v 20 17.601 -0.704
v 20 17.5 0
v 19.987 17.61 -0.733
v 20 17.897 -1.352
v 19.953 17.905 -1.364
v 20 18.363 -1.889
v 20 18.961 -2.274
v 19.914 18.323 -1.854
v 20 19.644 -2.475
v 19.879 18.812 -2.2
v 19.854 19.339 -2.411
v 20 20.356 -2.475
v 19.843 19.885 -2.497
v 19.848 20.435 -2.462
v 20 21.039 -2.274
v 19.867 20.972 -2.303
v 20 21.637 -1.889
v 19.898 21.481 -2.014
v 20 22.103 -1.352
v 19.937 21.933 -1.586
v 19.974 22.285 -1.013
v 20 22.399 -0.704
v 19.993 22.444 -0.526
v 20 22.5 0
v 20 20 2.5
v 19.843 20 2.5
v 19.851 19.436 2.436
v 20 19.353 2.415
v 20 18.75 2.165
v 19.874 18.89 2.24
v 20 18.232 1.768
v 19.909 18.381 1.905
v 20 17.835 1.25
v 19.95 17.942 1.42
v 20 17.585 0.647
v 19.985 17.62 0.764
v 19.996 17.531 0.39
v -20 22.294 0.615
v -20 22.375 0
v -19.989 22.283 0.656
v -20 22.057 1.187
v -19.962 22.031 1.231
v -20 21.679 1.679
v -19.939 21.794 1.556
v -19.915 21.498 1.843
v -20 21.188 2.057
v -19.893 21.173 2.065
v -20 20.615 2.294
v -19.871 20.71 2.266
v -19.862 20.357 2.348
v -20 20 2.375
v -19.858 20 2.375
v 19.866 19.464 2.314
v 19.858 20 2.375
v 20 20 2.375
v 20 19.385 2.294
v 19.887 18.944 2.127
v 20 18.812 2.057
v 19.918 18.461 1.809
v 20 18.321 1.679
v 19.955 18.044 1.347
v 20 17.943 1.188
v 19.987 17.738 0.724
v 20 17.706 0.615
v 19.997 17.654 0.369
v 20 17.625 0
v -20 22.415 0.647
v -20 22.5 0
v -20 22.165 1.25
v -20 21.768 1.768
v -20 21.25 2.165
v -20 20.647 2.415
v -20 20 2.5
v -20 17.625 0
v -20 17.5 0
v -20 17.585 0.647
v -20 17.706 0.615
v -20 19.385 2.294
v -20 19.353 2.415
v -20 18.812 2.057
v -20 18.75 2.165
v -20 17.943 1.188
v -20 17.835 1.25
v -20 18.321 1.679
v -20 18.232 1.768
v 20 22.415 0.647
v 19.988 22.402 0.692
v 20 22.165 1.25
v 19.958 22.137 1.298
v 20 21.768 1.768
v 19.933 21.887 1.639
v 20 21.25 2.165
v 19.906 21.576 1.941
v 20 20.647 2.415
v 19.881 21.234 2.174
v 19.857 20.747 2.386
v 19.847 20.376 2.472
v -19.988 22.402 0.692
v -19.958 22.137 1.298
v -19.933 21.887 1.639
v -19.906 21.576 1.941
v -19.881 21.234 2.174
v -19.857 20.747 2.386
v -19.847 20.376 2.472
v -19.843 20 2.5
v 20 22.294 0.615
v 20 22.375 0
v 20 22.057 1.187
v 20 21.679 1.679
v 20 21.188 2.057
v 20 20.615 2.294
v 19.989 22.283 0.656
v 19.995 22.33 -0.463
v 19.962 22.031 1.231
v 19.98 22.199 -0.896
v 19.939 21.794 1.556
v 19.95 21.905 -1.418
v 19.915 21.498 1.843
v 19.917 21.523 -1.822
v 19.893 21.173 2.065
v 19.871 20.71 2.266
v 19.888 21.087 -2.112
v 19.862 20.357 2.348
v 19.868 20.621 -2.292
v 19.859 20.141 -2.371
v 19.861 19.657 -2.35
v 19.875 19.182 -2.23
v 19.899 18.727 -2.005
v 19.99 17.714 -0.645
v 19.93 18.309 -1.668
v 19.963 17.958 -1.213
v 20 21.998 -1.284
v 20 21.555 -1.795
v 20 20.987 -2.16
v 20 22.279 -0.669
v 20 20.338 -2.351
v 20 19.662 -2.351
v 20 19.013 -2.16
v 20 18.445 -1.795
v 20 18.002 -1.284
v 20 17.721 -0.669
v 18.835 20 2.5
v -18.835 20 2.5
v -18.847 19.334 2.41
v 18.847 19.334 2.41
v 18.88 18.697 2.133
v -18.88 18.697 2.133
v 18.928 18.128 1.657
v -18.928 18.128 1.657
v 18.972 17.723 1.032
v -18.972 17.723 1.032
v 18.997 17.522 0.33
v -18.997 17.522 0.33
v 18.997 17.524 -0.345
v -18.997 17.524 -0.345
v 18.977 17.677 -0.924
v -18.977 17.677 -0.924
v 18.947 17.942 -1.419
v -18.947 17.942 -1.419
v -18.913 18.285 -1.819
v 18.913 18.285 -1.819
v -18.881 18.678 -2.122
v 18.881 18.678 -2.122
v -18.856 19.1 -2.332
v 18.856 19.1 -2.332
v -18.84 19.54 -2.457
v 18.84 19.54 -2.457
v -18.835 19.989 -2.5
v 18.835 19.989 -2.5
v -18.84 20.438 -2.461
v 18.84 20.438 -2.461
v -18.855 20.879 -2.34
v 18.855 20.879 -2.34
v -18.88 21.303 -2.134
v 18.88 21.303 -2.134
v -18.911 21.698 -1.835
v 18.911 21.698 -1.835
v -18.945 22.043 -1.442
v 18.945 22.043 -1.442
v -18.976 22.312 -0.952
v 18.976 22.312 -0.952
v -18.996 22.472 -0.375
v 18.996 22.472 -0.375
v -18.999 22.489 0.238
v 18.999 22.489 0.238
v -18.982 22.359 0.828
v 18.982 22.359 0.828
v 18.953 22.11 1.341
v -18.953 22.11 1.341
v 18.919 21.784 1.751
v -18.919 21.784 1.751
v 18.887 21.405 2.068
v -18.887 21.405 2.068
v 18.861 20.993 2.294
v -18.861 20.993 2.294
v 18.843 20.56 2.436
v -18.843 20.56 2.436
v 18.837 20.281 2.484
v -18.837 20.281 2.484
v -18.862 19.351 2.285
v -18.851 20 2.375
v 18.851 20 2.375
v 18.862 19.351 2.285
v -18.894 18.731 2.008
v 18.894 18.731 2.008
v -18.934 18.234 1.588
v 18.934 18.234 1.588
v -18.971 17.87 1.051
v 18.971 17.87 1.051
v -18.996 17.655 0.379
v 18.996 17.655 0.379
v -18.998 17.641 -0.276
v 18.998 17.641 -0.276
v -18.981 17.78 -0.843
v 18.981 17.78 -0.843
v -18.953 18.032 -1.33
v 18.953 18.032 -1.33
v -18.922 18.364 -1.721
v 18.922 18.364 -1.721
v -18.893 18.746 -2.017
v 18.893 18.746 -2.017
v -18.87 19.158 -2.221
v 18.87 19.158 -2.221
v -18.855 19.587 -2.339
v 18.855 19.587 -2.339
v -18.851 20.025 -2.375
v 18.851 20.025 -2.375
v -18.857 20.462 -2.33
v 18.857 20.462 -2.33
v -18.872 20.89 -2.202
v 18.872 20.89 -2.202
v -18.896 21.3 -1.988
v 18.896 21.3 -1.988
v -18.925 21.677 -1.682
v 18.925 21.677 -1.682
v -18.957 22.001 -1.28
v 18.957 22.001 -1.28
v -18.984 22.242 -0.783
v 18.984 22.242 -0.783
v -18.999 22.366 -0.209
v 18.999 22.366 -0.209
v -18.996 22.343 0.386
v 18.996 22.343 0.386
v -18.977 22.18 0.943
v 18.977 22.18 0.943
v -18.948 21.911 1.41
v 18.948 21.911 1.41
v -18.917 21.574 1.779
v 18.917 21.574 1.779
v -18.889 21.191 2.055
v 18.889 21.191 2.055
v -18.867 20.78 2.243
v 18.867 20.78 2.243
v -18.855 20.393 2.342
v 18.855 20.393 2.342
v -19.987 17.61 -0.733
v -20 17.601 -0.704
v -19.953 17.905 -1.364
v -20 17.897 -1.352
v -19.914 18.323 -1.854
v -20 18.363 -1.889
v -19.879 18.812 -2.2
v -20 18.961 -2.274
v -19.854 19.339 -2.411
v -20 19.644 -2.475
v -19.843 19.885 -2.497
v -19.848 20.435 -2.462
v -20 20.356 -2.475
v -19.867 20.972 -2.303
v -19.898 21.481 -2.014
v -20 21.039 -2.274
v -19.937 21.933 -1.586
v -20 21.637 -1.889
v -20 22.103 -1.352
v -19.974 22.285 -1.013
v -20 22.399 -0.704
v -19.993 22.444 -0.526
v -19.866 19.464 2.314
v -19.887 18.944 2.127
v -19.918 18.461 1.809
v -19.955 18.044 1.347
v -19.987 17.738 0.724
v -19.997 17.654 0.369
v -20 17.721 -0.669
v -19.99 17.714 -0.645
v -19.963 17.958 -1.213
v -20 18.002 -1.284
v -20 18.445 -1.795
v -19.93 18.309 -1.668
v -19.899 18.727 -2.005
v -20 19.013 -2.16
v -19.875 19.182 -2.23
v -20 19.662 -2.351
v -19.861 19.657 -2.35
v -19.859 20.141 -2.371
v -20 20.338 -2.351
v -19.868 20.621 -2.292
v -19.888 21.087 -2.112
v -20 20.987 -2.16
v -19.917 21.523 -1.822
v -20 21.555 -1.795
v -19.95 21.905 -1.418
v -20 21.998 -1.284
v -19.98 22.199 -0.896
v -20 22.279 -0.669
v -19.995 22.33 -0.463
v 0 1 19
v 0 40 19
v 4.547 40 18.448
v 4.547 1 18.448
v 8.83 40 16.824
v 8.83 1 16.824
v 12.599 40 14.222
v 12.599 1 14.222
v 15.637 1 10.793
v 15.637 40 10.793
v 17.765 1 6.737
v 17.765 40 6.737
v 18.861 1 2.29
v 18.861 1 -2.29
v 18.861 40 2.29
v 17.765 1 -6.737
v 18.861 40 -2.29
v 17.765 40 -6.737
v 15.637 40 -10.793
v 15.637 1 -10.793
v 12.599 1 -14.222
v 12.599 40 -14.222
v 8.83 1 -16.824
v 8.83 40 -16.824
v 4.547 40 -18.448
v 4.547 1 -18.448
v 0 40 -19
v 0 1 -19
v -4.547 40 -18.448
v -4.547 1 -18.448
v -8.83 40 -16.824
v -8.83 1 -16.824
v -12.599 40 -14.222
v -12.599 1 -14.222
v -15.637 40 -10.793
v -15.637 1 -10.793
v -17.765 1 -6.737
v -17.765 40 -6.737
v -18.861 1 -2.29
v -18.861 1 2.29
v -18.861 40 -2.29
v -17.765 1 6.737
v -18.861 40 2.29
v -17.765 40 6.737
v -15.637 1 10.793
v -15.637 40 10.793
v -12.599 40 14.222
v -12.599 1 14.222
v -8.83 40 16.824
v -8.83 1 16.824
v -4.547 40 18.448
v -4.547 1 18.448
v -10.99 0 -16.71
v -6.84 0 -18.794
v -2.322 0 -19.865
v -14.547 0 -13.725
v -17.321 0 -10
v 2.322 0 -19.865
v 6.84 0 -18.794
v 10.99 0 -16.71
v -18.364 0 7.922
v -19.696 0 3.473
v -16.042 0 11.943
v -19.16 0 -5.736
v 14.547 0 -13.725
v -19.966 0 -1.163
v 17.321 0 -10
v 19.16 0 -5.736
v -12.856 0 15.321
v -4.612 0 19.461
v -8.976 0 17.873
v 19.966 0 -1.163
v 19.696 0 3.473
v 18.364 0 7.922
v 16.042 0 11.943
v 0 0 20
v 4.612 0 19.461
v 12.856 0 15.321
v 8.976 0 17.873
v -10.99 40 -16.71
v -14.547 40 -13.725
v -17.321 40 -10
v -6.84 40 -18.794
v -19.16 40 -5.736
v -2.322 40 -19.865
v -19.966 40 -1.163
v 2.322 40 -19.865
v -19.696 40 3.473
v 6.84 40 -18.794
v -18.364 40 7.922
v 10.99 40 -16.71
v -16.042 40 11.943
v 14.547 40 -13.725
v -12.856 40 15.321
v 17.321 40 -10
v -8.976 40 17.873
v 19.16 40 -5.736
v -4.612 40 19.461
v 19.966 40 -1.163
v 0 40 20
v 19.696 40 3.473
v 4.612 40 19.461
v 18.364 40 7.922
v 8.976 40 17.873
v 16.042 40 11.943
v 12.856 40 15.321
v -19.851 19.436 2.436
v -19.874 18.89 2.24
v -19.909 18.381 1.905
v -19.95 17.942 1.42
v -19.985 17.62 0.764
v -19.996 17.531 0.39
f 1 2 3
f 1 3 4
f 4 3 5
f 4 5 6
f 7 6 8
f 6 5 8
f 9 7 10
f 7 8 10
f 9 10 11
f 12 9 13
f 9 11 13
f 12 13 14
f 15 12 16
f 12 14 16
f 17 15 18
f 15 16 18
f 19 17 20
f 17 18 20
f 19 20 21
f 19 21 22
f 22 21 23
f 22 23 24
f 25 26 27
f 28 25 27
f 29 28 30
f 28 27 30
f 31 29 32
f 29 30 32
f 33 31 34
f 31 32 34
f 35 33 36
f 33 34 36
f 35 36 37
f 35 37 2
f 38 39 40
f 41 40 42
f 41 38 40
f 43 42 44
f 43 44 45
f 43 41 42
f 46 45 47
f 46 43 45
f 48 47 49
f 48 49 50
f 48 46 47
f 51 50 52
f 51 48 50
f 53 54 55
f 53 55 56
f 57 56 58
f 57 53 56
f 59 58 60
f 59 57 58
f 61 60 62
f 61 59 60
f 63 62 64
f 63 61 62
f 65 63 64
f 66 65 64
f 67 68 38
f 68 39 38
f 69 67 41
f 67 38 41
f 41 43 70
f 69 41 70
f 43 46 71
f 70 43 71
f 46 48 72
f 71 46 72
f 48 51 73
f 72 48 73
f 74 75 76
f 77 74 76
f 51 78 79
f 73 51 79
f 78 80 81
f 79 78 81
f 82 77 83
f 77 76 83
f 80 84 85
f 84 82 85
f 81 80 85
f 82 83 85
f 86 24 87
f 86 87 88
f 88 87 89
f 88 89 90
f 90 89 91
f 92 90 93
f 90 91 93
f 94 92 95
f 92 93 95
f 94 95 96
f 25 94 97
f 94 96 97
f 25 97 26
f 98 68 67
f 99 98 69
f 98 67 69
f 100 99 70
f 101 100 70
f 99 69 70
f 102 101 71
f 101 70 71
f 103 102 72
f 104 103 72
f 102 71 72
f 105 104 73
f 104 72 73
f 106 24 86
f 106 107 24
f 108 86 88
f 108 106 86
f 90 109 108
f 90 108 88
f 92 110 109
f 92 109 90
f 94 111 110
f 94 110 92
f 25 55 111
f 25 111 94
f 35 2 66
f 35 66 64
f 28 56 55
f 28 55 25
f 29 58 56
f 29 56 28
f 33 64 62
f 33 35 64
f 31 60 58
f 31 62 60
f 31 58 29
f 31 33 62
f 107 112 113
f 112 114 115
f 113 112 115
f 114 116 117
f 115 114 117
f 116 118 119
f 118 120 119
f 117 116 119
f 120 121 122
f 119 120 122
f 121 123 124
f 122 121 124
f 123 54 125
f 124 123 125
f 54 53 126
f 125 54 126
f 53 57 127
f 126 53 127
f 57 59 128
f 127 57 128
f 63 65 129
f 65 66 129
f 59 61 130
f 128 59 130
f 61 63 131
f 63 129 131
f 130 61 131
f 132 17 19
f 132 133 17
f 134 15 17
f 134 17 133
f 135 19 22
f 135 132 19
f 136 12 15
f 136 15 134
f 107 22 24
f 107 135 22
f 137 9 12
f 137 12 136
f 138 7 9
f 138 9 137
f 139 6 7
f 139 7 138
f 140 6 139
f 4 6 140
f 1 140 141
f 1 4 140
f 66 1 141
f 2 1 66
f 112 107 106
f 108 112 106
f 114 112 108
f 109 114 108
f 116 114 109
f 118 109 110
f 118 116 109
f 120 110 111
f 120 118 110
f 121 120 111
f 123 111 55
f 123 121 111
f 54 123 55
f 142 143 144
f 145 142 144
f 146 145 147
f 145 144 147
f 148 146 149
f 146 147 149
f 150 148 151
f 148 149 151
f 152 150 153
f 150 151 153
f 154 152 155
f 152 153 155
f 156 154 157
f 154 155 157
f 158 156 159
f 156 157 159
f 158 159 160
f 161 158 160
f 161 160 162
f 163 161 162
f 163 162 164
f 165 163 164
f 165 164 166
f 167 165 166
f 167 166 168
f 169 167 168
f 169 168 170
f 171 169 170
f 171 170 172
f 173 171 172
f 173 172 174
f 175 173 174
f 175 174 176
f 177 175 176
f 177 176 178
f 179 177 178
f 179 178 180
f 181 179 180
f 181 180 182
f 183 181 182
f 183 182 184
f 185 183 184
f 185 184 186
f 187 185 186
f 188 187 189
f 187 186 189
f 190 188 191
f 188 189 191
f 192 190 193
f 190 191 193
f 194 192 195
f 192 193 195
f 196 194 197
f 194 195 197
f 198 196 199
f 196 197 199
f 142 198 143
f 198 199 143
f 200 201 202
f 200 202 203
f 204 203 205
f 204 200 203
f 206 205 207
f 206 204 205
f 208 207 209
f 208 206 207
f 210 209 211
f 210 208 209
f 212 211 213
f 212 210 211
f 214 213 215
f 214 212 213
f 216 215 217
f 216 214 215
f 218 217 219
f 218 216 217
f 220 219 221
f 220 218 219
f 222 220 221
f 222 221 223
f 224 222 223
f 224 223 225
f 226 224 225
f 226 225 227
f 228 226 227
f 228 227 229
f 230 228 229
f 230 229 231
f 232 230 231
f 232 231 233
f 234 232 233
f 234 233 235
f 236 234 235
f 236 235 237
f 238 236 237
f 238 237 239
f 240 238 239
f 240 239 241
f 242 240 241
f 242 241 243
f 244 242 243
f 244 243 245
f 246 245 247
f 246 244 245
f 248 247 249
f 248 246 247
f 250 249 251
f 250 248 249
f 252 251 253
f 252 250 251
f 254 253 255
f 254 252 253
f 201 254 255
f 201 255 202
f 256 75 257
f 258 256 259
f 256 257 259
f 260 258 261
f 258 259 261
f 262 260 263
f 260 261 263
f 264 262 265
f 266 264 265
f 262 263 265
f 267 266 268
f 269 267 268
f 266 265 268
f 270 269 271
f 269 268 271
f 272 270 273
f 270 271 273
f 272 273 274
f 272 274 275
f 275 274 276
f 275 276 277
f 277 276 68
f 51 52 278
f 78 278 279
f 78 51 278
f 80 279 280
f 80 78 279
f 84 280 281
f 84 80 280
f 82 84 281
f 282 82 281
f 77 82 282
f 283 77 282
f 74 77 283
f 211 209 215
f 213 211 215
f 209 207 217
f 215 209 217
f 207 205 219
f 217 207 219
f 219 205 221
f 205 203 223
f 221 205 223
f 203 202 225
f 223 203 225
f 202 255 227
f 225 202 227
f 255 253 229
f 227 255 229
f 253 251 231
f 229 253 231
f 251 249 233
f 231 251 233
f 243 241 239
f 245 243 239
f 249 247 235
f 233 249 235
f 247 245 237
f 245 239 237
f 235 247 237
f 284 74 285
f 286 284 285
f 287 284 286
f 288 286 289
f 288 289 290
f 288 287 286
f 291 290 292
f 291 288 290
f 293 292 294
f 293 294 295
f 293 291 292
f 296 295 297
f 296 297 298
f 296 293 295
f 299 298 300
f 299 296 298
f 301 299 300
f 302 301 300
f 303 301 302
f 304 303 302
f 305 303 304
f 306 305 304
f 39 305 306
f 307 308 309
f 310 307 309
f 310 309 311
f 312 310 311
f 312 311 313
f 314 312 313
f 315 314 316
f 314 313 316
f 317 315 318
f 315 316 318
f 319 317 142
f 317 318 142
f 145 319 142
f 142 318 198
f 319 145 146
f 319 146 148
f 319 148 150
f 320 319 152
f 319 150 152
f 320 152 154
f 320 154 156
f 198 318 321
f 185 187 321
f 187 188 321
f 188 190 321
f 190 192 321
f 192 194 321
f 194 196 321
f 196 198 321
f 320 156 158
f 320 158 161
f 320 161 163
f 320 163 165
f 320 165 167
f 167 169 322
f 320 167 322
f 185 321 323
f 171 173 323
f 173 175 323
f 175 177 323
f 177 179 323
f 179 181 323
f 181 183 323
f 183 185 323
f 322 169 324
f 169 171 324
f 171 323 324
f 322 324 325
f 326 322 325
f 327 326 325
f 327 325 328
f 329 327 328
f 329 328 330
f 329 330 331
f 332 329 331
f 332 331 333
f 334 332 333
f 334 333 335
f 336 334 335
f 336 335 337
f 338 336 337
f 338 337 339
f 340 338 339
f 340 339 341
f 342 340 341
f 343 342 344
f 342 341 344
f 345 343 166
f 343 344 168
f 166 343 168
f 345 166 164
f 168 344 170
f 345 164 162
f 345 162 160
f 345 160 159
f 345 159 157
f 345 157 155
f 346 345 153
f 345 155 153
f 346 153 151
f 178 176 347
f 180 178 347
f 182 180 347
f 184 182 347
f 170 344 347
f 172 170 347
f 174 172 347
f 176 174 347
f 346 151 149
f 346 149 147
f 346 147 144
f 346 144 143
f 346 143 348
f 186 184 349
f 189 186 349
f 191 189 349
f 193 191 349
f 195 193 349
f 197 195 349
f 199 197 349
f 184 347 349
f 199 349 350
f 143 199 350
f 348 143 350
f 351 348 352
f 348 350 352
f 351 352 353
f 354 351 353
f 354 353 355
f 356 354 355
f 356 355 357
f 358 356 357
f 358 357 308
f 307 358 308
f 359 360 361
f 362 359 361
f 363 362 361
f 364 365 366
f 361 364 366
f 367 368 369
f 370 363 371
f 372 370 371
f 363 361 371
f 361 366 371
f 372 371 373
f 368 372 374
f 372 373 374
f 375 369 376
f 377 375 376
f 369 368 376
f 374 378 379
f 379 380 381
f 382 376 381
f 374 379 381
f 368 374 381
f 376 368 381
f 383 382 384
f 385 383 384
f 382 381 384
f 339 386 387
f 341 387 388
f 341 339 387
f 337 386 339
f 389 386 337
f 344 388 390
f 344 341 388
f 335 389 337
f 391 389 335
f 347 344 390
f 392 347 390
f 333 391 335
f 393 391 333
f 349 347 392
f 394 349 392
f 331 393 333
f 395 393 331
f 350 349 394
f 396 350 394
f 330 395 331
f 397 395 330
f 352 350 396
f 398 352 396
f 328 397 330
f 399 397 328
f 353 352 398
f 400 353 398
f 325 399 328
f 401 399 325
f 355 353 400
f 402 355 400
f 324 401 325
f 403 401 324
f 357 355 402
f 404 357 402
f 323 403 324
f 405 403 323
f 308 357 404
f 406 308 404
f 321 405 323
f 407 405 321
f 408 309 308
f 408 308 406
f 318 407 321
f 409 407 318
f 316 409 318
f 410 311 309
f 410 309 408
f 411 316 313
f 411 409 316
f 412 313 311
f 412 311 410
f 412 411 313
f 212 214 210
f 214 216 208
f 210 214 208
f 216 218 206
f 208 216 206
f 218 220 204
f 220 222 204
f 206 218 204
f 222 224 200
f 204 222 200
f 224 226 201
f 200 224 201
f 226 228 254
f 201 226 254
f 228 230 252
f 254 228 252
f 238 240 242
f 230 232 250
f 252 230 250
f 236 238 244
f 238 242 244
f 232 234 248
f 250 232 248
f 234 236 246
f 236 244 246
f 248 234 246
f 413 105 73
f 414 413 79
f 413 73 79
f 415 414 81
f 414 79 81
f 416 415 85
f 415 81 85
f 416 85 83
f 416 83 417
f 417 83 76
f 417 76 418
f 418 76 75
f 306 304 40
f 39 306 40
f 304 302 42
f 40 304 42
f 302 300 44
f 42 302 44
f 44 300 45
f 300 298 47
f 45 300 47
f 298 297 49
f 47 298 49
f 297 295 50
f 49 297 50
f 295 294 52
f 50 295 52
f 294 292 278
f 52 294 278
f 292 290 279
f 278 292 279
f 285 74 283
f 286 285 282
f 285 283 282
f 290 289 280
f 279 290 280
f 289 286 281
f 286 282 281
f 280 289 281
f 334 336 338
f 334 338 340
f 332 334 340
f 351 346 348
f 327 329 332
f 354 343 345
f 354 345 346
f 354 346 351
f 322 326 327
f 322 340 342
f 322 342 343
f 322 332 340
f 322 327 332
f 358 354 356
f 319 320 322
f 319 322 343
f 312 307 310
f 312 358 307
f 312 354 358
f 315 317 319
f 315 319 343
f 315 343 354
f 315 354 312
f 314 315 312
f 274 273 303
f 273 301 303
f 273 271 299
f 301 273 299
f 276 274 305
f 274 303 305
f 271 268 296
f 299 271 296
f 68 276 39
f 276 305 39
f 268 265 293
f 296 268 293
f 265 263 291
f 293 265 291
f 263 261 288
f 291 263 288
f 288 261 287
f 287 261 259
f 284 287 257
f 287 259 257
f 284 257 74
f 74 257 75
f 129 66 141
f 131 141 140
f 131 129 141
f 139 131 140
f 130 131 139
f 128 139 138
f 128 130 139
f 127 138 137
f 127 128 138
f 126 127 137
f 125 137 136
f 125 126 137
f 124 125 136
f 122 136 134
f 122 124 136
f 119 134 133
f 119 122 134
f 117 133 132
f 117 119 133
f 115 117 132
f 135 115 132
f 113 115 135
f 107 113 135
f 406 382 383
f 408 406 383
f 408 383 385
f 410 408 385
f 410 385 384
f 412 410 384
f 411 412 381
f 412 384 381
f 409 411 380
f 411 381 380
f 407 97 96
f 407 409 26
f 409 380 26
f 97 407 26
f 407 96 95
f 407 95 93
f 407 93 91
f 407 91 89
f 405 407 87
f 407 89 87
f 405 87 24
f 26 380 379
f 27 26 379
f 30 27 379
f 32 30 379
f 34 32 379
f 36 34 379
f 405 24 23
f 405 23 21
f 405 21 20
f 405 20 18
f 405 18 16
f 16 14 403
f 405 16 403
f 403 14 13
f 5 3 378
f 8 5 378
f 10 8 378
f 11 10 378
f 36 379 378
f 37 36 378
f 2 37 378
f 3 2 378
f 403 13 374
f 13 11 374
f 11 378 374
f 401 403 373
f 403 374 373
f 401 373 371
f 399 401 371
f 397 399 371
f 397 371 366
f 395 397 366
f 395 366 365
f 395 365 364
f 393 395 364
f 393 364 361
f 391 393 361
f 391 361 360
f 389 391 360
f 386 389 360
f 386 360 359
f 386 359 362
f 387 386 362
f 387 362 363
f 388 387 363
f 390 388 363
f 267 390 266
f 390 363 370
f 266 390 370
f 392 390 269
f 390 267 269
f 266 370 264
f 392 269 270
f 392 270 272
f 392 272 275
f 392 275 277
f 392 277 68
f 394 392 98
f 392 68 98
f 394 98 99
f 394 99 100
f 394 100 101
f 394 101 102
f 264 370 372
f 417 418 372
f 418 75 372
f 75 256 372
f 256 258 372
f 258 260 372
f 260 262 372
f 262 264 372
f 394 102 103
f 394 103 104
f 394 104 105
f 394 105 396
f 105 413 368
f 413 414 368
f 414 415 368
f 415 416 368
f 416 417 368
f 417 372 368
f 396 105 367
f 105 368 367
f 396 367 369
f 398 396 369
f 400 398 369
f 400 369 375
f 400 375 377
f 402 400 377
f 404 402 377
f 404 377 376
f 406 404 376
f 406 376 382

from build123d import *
from build123d.topology import SkipClean

# Parameters (mm, degrees)
SKETCH1_R           = 20
BOSS_EXTRUDE1_DEPTH = 40
SKETCH2_R           = 19
CUT_EXTRUDE1_DEPTH  = 39
BOSS_EXTRUDE2_START = -20
SKETCH5_R           = 2.5
SKETCH5_R_2         = 2.375
BOSS_EXTRUDE2_DEPTH = 40


with BuildPart() as part:
    # Sketch1 → Boss-Extrude1 (new body)
    with BuildSketch(Plane(origin=(0, 0, 0), x_dir=(1, 0, 0), z_dir=(0, 1, 0))):
        with Locations(Location((0, 0, 0), (0, 0, 270))):
            Circle(SKETCH1_R)
    extrude(amount=BOSS_EXTRUDE1_DEPTH)

    # Sketch2 → Cut-Extrude1 (cut)
    with BuildSketch(Plane(origin=(0, 40, 0), x_dir=(1, 0, 0), z_dir=(0, 1, 0))):
        with Locations(Location((0, 0, 0), (0, 0, 270))):
            Circle(SKETCH2_R)
    extrude(amount=-CUT_EXTRUDE1_DEPTH, mode=Mode.SUBTRACT)

    # Sketch5 → Boss-Extrude2 (add)
    with SkipClean():  # the faces are left unmerged after this step: merging them gives an invalid solid
        with BuildSketch(Plane(origin=(0, 0, 0), x_dir=(0, 0, -1), z_dir=(1, 0, 0)).offset(BOSS_EXTRUDE2_START)):
            with Locations(Location((0, 20, 0), (0, 0, 180))):
                Circle(SKETCH5_R)
            with Locations(Location((0, 20, 0), (0, 0, 180))):
                Circle(SKETCH5_R_2, mode=Mode.SUBTRACT)
        extrude(amount=BOSS_EXTRUDE2_DEPTH)


solid = part.part
